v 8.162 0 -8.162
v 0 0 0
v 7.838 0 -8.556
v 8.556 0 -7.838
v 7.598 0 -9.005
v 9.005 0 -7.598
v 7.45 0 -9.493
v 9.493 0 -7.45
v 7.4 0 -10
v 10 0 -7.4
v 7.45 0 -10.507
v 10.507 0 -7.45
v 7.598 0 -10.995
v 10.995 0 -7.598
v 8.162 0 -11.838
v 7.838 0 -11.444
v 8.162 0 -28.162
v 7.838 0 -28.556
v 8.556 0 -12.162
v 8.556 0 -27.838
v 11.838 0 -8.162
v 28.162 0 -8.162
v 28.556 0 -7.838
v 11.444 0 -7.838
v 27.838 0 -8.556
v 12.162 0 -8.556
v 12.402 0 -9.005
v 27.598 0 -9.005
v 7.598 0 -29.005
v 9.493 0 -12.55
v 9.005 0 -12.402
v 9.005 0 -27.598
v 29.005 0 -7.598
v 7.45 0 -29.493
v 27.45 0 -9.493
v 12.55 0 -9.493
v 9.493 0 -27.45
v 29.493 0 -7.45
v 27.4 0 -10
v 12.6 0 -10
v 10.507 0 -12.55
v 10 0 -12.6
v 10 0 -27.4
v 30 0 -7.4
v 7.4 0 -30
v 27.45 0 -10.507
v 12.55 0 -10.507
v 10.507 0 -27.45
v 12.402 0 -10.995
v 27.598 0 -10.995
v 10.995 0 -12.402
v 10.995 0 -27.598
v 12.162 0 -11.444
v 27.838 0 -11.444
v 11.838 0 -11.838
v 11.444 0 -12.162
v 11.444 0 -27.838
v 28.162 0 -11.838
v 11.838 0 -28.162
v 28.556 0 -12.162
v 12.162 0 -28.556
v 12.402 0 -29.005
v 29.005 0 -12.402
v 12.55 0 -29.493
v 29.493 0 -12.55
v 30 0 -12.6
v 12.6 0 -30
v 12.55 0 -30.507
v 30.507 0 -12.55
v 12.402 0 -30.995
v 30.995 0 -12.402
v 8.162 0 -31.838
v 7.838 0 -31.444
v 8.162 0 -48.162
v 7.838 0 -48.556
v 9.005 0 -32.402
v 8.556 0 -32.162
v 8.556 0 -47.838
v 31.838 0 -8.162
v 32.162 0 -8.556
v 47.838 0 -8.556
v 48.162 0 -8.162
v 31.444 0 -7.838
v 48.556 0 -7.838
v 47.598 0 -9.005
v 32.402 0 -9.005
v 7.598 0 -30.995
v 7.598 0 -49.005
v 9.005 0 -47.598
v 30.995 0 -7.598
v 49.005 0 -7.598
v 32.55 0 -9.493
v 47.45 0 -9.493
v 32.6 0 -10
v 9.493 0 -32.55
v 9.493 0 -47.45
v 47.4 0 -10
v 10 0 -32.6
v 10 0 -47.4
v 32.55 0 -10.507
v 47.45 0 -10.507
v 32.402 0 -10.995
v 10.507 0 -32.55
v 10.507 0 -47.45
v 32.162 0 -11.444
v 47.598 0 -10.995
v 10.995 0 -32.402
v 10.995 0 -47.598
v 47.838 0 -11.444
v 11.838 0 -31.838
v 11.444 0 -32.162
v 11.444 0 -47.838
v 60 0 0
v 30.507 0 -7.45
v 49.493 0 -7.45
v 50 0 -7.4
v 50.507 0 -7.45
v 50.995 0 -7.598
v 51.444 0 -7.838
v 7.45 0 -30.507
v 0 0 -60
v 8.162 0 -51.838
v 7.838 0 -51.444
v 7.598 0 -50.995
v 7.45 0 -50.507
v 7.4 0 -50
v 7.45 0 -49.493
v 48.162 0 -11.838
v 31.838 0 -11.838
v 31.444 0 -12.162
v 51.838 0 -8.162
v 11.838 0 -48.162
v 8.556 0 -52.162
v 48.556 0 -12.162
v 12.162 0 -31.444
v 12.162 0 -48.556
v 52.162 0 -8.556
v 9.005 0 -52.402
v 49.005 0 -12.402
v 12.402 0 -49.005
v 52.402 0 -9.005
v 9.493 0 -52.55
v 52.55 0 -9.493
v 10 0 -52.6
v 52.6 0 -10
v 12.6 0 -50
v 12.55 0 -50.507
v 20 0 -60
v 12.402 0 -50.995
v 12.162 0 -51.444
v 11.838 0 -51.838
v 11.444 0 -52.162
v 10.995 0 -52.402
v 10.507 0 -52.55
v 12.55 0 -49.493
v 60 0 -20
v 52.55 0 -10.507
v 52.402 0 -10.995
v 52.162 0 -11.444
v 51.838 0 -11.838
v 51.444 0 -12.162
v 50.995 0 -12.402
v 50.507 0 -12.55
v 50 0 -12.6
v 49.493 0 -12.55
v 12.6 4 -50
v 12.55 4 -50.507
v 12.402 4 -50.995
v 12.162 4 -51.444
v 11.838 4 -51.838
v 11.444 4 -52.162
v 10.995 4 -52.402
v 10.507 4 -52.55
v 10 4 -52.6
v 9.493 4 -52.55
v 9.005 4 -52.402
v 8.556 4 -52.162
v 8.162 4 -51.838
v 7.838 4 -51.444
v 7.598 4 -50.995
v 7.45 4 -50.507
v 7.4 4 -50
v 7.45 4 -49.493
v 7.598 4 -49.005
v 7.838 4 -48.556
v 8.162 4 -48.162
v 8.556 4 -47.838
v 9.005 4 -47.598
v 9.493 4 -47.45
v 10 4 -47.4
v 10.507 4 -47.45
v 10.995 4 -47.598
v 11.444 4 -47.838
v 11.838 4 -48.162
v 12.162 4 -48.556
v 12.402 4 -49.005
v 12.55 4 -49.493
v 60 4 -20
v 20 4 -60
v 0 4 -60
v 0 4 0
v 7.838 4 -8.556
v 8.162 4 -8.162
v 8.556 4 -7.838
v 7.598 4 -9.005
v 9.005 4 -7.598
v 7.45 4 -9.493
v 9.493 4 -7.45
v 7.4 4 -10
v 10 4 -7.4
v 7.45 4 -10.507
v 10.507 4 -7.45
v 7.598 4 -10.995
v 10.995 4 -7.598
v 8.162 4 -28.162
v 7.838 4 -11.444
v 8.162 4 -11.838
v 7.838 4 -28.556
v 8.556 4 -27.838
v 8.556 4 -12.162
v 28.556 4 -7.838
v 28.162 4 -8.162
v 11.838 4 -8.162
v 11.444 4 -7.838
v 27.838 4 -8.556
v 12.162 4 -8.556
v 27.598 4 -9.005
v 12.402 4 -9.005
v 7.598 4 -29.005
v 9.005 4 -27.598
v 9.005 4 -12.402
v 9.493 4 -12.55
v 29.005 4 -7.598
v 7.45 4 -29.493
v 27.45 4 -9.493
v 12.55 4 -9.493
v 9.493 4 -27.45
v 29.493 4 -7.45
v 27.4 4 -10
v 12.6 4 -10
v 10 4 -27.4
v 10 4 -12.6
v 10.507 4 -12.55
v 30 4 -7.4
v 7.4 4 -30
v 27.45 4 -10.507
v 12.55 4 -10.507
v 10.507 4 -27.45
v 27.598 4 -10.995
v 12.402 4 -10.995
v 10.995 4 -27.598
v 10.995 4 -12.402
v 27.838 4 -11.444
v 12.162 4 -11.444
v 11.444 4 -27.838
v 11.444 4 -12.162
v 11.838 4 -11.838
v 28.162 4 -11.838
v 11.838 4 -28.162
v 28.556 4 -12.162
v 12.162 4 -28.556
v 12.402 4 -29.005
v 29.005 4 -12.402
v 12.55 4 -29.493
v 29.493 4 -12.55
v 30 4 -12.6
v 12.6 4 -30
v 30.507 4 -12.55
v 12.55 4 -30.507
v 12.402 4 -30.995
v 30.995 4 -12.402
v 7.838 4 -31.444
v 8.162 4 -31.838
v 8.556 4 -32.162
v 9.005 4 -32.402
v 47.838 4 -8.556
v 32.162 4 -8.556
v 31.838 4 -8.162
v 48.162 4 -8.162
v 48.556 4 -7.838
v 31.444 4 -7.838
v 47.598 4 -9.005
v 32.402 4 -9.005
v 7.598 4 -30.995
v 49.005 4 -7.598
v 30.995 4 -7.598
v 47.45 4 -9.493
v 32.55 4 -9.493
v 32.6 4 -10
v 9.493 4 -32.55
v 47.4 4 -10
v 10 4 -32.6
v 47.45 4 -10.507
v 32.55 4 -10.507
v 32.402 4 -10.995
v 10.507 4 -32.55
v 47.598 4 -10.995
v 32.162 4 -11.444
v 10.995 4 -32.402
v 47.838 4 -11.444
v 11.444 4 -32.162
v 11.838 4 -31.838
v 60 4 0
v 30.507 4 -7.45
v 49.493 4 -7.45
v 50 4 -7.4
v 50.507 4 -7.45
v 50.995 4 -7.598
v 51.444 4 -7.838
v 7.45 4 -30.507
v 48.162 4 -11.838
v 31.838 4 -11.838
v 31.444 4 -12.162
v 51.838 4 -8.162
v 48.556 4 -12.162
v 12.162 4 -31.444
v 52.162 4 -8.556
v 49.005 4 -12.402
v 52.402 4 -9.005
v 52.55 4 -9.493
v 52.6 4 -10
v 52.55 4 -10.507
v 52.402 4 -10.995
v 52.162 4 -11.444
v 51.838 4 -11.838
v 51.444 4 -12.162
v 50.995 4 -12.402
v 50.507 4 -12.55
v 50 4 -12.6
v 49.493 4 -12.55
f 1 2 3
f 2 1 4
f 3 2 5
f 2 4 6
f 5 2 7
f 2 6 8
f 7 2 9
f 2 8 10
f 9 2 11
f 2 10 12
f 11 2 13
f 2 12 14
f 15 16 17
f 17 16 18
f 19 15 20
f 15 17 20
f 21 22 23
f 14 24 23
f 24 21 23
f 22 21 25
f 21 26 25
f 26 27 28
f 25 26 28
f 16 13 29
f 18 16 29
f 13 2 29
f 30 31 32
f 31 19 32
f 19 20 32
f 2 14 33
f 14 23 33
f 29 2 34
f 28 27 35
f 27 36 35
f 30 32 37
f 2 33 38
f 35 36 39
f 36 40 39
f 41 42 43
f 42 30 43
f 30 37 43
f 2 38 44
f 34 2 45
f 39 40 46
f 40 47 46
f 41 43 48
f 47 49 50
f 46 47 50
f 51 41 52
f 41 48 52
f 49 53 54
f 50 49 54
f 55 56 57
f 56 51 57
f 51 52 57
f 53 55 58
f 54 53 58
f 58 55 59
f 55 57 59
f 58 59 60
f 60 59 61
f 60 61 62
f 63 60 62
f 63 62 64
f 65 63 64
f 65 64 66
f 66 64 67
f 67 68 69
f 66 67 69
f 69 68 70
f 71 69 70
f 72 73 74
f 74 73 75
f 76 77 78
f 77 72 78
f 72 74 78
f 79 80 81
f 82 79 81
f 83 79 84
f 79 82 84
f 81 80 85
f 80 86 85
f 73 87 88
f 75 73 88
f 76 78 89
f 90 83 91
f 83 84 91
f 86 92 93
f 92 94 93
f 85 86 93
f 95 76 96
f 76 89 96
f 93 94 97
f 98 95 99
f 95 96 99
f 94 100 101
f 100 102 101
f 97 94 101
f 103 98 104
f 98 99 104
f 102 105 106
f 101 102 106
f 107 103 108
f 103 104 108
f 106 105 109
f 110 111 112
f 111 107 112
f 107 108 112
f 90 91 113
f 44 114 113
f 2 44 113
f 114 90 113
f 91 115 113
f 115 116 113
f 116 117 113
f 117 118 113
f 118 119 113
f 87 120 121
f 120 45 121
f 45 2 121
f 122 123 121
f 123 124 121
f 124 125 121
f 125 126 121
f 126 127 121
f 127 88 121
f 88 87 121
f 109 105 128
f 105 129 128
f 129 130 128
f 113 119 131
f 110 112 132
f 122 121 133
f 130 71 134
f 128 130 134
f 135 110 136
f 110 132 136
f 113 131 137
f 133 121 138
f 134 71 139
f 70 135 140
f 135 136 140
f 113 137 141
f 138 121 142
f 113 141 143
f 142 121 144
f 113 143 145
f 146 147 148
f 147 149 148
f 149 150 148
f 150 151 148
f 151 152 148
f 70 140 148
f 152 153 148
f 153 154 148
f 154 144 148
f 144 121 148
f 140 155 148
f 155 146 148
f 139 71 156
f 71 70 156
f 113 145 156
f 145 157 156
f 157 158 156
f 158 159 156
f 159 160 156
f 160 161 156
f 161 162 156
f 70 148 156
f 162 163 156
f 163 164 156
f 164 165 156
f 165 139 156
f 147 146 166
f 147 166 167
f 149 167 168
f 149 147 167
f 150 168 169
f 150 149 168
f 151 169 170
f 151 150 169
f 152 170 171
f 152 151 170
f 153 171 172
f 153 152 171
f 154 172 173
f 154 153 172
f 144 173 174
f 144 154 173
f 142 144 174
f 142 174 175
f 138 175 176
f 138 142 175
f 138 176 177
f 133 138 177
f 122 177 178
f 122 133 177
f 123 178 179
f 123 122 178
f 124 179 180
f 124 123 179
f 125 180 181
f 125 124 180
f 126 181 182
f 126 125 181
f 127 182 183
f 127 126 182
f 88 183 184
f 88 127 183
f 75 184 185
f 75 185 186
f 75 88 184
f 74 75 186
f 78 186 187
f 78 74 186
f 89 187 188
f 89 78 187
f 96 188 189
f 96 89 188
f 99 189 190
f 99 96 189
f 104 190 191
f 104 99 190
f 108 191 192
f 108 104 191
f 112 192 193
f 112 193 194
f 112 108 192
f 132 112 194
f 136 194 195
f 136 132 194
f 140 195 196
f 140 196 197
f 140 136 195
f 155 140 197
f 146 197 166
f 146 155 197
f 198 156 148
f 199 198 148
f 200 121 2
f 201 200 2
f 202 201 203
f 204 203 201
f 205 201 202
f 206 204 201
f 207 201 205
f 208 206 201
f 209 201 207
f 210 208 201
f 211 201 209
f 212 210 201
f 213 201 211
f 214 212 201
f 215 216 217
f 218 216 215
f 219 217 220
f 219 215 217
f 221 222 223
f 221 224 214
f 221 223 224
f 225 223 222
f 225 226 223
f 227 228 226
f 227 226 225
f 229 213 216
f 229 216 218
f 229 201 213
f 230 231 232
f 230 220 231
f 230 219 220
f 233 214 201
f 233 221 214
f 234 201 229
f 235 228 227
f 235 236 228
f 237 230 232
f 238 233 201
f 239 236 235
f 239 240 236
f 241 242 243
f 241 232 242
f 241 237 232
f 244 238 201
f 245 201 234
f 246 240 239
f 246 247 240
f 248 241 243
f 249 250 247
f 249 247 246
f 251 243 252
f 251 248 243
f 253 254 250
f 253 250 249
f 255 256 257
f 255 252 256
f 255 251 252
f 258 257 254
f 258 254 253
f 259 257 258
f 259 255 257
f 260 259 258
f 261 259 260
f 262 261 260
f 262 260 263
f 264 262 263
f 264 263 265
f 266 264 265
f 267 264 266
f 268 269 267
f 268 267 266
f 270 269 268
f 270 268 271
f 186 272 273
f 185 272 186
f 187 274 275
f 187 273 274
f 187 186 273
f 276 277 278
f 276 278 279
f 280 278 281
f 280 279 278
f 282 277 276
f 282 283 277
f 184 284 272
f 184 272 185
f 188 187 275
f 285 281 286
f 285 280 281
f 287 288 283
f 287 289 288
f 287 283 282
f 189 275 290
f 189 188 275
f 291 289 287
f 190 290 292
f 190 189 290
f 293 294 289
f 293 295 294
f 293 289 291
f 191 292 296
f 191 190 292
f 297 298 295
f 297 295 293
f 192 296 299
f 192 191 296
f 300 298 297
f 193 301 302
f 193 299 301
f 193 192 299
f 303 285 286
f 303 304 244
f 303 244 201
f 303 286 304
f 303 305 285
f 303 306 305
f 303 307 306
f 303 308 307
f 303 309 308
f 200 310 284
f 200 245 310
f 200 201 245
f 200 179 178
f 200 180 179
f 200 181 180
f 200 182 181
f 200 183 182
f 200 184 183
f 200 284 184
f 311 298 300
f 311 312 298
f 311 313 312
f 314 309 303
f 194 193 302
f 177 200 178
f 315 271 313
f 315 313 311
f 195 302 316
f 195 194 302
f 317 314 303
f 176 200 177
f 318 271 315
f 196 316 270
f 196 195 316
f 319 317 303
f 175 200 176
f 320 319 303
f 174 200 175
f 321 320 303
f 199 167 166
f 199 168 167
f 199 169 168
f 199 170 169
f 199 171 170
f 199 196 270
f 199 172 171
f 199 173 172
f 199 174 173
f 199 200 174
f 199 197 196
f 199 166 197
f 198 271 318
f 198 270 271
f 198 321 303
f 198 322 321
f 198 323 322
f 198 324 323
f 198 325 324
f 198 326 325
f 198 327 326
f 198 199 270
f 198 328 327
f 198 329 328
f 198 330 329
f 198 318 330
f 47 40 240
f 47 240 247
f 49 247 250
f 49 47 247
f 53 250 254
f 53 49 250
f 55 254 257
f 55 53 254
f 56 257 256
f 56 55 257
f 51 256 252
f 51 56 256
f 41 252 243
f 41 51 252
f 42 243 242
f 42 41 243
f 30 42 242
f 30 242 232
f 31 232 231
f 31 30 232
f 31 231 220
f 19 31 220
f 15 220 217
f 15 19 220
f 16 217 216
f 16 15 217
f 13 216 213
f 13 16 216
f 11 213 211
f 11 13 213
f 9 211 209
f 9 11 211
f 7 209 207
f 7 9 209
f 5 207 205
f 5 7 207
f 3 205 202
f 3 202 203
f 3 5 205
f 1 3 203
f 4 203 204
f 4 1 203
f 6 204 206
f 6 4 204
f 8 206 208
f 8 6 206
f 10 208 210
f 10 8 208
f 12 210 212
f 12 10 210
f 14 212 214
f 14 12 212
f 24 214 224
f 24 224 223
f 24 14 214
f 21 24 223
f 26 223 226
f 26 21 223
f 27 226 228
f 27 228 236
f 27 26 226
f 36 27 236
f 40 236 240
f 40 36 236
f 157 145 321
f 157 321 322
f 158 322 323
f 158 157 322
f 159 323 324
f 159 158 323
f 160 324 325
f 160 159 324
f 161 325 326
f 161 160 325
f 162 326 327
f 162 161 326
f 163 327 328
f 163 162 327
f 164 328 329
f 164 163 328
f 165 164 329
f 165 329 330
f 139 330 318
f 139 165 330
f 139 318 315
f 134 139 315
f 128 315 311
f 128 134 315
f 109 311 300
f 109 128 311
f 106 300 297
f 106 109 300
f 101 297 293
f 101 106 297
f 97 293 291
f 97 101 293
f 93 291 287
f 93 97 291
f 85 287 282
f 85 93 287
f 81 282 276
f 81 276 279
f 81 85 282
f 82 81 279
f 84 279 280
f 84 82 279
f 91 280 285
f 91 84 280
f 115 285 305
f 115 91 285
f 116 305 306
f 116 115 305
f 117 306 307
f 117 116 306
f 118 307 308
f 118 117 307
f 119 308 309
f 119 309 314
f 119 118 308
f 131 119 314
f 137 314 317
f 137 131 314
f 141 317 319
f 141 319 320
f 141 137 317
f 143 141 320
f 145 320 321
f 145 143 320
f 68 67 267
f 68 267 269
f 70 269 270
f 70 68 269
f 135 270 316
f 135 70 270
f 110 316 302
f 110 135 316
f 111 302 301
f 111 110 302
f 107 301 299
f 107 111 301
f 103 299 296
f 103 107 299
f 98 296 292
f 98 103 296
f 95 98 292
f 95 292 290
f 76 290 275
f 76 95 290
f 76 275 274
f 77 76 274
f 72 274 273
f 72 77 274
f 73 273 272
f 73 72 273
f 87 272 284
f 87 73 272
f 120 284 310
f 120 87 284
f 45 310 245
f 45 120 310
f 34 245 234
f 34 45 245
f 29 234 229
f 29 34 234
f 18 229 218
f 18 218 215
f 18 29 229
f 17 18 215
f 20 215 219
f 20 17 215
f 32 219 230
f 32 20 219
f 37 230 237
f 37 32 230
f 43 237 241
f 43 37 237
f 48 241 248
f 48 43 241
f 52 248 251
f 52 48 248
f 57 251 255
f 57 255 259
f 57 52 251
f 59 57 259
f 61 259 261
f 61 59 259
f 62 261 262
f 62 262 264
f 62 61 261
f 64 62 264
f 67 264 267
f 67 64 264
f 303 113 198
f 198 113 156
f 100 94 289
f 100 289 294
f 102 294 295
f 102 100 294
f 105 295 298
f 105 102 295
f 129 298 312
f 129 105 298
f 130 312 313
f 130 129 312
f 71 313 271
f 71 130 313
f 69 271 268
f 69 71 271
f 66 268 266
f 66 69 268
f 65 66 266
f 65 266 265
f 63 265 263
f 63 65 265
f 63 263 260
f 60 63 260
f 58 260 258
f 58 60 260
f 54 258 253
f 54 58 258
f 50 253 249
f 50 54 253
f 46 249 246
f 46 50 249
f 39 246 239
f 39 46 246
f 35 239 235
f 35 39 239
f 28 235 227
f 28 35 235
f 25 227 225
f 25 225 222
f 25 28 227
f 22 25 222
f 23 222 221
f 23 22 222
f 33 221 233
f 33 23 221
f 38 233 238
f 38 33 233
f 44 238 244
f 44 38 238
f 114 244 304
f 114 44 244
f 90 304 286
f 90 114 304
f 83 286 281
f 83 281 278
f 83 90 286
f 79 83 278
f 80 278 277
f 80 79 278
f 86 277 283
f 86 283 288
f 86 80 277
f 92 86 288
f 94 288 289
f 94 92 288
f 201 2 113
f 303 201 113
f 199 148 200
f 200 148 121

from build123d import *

# Parameters (mm, degrees)
SKETCH1_R           = 2.6
BOSS_EXTRUDE1_DEPTH = 4


with BuildPart() as part:
    # Sketch1 → Boss-Extrude1 (new body)
    with BuildSketch(Plane(origin=(0, 0, 0), x_dir=(1, 0, 0), z_dir=(0, 1, 0))):
        Polygon((0, 0), (60, 0), (60, 20), (20, 60), (0, 60), align=None)
        with Locations((10, 10)):
            Circle(SKETCH1_R, mode=Mode.SUBTRACT)
        with Locations((30, 10)):
            Circle(SKETCH1_R, mode=Mode.SUBTRACT)
        with Locations((50, 10)):
            Circle(SKETCH1_R, mode=Mode.SUBTRACT)
        with Locations((10, 30)):
            Circle(SKETCH1_R, mode=Mode.SUBTRACT)
        with Locations((10, 50)):
            Circle(SKETCH1_R, mode=Mode.SUBTRACT)
    extrude(amount=BOSS_EXTRUDE1_DEPTH)


solid = part.part
